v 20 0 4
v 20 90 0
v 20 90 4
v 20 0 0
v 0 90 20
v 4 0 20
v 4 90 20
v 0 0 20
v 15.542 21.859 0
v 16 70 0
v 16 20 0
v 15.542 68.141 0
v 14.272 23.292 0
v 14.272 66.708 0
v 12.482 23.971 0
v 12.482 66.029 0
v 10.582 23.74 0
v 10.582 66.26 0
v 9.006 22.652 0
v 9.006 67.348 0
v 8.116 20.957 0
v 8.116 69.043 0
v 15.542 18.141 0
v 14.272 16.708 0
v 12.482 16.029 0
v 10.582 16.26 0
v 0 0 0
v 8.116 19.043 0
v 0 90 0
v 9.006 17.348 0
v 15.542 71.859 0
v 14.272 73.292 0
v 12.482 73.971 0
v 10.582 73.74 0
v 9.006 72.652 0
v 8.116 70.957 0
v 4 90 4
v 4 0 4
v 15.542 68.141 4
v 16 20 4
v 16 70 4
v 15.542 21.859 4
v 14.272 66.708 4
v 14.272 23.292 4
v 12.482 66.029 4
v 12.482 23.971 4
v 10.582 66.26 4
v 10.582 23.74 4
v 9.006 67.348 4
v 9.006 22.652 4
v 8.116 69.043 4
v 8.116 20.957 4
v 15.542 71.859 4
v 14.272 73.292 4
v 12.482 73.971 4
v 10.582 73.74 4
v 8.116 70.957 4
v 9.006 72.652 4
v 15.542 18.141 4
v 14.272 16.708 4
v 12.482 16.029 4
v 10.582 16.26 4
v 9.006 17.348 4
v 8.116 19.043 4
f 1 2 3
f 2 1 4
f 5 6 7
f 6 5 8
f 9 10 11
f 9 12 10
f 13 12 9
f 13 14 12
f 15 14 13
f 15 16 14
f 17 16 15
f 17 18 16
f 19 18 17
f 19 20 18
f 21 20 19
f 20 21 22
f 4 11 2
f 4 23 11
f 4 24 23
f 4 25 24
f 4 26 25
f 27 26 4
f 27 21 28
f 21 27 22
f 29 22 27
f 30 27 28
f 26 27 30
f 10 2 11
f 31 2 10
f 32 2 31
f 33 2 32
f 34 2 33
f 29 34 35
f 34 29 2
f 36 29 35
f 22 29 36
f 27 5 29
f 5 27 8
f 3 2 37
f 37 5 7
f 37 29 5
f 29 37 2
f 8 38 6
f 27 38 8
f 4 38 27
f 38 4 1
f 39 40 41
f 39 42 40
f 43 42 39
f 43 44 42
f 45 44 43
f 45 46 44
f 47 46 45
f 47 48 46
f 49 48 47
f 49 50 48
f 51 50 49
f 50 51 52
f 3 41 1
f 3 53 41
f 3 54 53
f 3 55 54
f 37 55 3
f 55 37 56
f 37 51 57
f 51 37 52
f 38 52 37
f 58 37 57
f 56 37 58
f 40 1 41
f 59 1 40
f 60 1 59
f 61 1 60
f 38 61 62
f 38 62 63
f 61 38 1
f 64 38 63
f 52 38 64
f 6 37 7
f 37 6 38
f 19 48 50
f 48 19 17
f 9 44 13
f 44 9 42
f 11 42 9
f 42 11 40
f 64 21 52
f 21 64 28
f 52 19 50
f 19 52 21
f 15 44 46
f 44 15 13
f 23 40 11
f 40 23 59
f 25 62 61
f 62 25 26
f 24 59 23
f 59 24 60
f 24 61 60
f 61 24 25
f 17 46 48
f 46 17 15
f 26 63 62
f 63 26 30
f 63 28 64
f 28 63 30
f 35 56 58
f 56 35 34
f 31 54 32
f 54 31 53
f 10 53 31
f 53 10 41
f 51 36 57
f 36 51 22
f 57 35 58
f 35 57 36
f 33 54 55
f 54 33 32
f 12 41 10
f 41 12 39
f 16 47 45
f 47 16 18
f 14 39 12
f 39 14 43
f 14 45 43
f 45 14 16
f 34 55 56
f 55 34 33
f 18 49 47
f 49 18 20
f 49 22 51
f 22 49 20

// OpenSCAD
module angleiron(l=90,s=20,t=4){
// l = length, s=side, t=thickness
  difference(){
    cube([s,l,s]);
    translate([t,0,t]) cube([s-t,l,s-t]);
  }
}


difference(){
  angleiron();
  translate([12,20,0]){
    cylinder(10,r=4);
  }
   translate([12,70,0]){
    cylinder(10,r=4);
  }

}
